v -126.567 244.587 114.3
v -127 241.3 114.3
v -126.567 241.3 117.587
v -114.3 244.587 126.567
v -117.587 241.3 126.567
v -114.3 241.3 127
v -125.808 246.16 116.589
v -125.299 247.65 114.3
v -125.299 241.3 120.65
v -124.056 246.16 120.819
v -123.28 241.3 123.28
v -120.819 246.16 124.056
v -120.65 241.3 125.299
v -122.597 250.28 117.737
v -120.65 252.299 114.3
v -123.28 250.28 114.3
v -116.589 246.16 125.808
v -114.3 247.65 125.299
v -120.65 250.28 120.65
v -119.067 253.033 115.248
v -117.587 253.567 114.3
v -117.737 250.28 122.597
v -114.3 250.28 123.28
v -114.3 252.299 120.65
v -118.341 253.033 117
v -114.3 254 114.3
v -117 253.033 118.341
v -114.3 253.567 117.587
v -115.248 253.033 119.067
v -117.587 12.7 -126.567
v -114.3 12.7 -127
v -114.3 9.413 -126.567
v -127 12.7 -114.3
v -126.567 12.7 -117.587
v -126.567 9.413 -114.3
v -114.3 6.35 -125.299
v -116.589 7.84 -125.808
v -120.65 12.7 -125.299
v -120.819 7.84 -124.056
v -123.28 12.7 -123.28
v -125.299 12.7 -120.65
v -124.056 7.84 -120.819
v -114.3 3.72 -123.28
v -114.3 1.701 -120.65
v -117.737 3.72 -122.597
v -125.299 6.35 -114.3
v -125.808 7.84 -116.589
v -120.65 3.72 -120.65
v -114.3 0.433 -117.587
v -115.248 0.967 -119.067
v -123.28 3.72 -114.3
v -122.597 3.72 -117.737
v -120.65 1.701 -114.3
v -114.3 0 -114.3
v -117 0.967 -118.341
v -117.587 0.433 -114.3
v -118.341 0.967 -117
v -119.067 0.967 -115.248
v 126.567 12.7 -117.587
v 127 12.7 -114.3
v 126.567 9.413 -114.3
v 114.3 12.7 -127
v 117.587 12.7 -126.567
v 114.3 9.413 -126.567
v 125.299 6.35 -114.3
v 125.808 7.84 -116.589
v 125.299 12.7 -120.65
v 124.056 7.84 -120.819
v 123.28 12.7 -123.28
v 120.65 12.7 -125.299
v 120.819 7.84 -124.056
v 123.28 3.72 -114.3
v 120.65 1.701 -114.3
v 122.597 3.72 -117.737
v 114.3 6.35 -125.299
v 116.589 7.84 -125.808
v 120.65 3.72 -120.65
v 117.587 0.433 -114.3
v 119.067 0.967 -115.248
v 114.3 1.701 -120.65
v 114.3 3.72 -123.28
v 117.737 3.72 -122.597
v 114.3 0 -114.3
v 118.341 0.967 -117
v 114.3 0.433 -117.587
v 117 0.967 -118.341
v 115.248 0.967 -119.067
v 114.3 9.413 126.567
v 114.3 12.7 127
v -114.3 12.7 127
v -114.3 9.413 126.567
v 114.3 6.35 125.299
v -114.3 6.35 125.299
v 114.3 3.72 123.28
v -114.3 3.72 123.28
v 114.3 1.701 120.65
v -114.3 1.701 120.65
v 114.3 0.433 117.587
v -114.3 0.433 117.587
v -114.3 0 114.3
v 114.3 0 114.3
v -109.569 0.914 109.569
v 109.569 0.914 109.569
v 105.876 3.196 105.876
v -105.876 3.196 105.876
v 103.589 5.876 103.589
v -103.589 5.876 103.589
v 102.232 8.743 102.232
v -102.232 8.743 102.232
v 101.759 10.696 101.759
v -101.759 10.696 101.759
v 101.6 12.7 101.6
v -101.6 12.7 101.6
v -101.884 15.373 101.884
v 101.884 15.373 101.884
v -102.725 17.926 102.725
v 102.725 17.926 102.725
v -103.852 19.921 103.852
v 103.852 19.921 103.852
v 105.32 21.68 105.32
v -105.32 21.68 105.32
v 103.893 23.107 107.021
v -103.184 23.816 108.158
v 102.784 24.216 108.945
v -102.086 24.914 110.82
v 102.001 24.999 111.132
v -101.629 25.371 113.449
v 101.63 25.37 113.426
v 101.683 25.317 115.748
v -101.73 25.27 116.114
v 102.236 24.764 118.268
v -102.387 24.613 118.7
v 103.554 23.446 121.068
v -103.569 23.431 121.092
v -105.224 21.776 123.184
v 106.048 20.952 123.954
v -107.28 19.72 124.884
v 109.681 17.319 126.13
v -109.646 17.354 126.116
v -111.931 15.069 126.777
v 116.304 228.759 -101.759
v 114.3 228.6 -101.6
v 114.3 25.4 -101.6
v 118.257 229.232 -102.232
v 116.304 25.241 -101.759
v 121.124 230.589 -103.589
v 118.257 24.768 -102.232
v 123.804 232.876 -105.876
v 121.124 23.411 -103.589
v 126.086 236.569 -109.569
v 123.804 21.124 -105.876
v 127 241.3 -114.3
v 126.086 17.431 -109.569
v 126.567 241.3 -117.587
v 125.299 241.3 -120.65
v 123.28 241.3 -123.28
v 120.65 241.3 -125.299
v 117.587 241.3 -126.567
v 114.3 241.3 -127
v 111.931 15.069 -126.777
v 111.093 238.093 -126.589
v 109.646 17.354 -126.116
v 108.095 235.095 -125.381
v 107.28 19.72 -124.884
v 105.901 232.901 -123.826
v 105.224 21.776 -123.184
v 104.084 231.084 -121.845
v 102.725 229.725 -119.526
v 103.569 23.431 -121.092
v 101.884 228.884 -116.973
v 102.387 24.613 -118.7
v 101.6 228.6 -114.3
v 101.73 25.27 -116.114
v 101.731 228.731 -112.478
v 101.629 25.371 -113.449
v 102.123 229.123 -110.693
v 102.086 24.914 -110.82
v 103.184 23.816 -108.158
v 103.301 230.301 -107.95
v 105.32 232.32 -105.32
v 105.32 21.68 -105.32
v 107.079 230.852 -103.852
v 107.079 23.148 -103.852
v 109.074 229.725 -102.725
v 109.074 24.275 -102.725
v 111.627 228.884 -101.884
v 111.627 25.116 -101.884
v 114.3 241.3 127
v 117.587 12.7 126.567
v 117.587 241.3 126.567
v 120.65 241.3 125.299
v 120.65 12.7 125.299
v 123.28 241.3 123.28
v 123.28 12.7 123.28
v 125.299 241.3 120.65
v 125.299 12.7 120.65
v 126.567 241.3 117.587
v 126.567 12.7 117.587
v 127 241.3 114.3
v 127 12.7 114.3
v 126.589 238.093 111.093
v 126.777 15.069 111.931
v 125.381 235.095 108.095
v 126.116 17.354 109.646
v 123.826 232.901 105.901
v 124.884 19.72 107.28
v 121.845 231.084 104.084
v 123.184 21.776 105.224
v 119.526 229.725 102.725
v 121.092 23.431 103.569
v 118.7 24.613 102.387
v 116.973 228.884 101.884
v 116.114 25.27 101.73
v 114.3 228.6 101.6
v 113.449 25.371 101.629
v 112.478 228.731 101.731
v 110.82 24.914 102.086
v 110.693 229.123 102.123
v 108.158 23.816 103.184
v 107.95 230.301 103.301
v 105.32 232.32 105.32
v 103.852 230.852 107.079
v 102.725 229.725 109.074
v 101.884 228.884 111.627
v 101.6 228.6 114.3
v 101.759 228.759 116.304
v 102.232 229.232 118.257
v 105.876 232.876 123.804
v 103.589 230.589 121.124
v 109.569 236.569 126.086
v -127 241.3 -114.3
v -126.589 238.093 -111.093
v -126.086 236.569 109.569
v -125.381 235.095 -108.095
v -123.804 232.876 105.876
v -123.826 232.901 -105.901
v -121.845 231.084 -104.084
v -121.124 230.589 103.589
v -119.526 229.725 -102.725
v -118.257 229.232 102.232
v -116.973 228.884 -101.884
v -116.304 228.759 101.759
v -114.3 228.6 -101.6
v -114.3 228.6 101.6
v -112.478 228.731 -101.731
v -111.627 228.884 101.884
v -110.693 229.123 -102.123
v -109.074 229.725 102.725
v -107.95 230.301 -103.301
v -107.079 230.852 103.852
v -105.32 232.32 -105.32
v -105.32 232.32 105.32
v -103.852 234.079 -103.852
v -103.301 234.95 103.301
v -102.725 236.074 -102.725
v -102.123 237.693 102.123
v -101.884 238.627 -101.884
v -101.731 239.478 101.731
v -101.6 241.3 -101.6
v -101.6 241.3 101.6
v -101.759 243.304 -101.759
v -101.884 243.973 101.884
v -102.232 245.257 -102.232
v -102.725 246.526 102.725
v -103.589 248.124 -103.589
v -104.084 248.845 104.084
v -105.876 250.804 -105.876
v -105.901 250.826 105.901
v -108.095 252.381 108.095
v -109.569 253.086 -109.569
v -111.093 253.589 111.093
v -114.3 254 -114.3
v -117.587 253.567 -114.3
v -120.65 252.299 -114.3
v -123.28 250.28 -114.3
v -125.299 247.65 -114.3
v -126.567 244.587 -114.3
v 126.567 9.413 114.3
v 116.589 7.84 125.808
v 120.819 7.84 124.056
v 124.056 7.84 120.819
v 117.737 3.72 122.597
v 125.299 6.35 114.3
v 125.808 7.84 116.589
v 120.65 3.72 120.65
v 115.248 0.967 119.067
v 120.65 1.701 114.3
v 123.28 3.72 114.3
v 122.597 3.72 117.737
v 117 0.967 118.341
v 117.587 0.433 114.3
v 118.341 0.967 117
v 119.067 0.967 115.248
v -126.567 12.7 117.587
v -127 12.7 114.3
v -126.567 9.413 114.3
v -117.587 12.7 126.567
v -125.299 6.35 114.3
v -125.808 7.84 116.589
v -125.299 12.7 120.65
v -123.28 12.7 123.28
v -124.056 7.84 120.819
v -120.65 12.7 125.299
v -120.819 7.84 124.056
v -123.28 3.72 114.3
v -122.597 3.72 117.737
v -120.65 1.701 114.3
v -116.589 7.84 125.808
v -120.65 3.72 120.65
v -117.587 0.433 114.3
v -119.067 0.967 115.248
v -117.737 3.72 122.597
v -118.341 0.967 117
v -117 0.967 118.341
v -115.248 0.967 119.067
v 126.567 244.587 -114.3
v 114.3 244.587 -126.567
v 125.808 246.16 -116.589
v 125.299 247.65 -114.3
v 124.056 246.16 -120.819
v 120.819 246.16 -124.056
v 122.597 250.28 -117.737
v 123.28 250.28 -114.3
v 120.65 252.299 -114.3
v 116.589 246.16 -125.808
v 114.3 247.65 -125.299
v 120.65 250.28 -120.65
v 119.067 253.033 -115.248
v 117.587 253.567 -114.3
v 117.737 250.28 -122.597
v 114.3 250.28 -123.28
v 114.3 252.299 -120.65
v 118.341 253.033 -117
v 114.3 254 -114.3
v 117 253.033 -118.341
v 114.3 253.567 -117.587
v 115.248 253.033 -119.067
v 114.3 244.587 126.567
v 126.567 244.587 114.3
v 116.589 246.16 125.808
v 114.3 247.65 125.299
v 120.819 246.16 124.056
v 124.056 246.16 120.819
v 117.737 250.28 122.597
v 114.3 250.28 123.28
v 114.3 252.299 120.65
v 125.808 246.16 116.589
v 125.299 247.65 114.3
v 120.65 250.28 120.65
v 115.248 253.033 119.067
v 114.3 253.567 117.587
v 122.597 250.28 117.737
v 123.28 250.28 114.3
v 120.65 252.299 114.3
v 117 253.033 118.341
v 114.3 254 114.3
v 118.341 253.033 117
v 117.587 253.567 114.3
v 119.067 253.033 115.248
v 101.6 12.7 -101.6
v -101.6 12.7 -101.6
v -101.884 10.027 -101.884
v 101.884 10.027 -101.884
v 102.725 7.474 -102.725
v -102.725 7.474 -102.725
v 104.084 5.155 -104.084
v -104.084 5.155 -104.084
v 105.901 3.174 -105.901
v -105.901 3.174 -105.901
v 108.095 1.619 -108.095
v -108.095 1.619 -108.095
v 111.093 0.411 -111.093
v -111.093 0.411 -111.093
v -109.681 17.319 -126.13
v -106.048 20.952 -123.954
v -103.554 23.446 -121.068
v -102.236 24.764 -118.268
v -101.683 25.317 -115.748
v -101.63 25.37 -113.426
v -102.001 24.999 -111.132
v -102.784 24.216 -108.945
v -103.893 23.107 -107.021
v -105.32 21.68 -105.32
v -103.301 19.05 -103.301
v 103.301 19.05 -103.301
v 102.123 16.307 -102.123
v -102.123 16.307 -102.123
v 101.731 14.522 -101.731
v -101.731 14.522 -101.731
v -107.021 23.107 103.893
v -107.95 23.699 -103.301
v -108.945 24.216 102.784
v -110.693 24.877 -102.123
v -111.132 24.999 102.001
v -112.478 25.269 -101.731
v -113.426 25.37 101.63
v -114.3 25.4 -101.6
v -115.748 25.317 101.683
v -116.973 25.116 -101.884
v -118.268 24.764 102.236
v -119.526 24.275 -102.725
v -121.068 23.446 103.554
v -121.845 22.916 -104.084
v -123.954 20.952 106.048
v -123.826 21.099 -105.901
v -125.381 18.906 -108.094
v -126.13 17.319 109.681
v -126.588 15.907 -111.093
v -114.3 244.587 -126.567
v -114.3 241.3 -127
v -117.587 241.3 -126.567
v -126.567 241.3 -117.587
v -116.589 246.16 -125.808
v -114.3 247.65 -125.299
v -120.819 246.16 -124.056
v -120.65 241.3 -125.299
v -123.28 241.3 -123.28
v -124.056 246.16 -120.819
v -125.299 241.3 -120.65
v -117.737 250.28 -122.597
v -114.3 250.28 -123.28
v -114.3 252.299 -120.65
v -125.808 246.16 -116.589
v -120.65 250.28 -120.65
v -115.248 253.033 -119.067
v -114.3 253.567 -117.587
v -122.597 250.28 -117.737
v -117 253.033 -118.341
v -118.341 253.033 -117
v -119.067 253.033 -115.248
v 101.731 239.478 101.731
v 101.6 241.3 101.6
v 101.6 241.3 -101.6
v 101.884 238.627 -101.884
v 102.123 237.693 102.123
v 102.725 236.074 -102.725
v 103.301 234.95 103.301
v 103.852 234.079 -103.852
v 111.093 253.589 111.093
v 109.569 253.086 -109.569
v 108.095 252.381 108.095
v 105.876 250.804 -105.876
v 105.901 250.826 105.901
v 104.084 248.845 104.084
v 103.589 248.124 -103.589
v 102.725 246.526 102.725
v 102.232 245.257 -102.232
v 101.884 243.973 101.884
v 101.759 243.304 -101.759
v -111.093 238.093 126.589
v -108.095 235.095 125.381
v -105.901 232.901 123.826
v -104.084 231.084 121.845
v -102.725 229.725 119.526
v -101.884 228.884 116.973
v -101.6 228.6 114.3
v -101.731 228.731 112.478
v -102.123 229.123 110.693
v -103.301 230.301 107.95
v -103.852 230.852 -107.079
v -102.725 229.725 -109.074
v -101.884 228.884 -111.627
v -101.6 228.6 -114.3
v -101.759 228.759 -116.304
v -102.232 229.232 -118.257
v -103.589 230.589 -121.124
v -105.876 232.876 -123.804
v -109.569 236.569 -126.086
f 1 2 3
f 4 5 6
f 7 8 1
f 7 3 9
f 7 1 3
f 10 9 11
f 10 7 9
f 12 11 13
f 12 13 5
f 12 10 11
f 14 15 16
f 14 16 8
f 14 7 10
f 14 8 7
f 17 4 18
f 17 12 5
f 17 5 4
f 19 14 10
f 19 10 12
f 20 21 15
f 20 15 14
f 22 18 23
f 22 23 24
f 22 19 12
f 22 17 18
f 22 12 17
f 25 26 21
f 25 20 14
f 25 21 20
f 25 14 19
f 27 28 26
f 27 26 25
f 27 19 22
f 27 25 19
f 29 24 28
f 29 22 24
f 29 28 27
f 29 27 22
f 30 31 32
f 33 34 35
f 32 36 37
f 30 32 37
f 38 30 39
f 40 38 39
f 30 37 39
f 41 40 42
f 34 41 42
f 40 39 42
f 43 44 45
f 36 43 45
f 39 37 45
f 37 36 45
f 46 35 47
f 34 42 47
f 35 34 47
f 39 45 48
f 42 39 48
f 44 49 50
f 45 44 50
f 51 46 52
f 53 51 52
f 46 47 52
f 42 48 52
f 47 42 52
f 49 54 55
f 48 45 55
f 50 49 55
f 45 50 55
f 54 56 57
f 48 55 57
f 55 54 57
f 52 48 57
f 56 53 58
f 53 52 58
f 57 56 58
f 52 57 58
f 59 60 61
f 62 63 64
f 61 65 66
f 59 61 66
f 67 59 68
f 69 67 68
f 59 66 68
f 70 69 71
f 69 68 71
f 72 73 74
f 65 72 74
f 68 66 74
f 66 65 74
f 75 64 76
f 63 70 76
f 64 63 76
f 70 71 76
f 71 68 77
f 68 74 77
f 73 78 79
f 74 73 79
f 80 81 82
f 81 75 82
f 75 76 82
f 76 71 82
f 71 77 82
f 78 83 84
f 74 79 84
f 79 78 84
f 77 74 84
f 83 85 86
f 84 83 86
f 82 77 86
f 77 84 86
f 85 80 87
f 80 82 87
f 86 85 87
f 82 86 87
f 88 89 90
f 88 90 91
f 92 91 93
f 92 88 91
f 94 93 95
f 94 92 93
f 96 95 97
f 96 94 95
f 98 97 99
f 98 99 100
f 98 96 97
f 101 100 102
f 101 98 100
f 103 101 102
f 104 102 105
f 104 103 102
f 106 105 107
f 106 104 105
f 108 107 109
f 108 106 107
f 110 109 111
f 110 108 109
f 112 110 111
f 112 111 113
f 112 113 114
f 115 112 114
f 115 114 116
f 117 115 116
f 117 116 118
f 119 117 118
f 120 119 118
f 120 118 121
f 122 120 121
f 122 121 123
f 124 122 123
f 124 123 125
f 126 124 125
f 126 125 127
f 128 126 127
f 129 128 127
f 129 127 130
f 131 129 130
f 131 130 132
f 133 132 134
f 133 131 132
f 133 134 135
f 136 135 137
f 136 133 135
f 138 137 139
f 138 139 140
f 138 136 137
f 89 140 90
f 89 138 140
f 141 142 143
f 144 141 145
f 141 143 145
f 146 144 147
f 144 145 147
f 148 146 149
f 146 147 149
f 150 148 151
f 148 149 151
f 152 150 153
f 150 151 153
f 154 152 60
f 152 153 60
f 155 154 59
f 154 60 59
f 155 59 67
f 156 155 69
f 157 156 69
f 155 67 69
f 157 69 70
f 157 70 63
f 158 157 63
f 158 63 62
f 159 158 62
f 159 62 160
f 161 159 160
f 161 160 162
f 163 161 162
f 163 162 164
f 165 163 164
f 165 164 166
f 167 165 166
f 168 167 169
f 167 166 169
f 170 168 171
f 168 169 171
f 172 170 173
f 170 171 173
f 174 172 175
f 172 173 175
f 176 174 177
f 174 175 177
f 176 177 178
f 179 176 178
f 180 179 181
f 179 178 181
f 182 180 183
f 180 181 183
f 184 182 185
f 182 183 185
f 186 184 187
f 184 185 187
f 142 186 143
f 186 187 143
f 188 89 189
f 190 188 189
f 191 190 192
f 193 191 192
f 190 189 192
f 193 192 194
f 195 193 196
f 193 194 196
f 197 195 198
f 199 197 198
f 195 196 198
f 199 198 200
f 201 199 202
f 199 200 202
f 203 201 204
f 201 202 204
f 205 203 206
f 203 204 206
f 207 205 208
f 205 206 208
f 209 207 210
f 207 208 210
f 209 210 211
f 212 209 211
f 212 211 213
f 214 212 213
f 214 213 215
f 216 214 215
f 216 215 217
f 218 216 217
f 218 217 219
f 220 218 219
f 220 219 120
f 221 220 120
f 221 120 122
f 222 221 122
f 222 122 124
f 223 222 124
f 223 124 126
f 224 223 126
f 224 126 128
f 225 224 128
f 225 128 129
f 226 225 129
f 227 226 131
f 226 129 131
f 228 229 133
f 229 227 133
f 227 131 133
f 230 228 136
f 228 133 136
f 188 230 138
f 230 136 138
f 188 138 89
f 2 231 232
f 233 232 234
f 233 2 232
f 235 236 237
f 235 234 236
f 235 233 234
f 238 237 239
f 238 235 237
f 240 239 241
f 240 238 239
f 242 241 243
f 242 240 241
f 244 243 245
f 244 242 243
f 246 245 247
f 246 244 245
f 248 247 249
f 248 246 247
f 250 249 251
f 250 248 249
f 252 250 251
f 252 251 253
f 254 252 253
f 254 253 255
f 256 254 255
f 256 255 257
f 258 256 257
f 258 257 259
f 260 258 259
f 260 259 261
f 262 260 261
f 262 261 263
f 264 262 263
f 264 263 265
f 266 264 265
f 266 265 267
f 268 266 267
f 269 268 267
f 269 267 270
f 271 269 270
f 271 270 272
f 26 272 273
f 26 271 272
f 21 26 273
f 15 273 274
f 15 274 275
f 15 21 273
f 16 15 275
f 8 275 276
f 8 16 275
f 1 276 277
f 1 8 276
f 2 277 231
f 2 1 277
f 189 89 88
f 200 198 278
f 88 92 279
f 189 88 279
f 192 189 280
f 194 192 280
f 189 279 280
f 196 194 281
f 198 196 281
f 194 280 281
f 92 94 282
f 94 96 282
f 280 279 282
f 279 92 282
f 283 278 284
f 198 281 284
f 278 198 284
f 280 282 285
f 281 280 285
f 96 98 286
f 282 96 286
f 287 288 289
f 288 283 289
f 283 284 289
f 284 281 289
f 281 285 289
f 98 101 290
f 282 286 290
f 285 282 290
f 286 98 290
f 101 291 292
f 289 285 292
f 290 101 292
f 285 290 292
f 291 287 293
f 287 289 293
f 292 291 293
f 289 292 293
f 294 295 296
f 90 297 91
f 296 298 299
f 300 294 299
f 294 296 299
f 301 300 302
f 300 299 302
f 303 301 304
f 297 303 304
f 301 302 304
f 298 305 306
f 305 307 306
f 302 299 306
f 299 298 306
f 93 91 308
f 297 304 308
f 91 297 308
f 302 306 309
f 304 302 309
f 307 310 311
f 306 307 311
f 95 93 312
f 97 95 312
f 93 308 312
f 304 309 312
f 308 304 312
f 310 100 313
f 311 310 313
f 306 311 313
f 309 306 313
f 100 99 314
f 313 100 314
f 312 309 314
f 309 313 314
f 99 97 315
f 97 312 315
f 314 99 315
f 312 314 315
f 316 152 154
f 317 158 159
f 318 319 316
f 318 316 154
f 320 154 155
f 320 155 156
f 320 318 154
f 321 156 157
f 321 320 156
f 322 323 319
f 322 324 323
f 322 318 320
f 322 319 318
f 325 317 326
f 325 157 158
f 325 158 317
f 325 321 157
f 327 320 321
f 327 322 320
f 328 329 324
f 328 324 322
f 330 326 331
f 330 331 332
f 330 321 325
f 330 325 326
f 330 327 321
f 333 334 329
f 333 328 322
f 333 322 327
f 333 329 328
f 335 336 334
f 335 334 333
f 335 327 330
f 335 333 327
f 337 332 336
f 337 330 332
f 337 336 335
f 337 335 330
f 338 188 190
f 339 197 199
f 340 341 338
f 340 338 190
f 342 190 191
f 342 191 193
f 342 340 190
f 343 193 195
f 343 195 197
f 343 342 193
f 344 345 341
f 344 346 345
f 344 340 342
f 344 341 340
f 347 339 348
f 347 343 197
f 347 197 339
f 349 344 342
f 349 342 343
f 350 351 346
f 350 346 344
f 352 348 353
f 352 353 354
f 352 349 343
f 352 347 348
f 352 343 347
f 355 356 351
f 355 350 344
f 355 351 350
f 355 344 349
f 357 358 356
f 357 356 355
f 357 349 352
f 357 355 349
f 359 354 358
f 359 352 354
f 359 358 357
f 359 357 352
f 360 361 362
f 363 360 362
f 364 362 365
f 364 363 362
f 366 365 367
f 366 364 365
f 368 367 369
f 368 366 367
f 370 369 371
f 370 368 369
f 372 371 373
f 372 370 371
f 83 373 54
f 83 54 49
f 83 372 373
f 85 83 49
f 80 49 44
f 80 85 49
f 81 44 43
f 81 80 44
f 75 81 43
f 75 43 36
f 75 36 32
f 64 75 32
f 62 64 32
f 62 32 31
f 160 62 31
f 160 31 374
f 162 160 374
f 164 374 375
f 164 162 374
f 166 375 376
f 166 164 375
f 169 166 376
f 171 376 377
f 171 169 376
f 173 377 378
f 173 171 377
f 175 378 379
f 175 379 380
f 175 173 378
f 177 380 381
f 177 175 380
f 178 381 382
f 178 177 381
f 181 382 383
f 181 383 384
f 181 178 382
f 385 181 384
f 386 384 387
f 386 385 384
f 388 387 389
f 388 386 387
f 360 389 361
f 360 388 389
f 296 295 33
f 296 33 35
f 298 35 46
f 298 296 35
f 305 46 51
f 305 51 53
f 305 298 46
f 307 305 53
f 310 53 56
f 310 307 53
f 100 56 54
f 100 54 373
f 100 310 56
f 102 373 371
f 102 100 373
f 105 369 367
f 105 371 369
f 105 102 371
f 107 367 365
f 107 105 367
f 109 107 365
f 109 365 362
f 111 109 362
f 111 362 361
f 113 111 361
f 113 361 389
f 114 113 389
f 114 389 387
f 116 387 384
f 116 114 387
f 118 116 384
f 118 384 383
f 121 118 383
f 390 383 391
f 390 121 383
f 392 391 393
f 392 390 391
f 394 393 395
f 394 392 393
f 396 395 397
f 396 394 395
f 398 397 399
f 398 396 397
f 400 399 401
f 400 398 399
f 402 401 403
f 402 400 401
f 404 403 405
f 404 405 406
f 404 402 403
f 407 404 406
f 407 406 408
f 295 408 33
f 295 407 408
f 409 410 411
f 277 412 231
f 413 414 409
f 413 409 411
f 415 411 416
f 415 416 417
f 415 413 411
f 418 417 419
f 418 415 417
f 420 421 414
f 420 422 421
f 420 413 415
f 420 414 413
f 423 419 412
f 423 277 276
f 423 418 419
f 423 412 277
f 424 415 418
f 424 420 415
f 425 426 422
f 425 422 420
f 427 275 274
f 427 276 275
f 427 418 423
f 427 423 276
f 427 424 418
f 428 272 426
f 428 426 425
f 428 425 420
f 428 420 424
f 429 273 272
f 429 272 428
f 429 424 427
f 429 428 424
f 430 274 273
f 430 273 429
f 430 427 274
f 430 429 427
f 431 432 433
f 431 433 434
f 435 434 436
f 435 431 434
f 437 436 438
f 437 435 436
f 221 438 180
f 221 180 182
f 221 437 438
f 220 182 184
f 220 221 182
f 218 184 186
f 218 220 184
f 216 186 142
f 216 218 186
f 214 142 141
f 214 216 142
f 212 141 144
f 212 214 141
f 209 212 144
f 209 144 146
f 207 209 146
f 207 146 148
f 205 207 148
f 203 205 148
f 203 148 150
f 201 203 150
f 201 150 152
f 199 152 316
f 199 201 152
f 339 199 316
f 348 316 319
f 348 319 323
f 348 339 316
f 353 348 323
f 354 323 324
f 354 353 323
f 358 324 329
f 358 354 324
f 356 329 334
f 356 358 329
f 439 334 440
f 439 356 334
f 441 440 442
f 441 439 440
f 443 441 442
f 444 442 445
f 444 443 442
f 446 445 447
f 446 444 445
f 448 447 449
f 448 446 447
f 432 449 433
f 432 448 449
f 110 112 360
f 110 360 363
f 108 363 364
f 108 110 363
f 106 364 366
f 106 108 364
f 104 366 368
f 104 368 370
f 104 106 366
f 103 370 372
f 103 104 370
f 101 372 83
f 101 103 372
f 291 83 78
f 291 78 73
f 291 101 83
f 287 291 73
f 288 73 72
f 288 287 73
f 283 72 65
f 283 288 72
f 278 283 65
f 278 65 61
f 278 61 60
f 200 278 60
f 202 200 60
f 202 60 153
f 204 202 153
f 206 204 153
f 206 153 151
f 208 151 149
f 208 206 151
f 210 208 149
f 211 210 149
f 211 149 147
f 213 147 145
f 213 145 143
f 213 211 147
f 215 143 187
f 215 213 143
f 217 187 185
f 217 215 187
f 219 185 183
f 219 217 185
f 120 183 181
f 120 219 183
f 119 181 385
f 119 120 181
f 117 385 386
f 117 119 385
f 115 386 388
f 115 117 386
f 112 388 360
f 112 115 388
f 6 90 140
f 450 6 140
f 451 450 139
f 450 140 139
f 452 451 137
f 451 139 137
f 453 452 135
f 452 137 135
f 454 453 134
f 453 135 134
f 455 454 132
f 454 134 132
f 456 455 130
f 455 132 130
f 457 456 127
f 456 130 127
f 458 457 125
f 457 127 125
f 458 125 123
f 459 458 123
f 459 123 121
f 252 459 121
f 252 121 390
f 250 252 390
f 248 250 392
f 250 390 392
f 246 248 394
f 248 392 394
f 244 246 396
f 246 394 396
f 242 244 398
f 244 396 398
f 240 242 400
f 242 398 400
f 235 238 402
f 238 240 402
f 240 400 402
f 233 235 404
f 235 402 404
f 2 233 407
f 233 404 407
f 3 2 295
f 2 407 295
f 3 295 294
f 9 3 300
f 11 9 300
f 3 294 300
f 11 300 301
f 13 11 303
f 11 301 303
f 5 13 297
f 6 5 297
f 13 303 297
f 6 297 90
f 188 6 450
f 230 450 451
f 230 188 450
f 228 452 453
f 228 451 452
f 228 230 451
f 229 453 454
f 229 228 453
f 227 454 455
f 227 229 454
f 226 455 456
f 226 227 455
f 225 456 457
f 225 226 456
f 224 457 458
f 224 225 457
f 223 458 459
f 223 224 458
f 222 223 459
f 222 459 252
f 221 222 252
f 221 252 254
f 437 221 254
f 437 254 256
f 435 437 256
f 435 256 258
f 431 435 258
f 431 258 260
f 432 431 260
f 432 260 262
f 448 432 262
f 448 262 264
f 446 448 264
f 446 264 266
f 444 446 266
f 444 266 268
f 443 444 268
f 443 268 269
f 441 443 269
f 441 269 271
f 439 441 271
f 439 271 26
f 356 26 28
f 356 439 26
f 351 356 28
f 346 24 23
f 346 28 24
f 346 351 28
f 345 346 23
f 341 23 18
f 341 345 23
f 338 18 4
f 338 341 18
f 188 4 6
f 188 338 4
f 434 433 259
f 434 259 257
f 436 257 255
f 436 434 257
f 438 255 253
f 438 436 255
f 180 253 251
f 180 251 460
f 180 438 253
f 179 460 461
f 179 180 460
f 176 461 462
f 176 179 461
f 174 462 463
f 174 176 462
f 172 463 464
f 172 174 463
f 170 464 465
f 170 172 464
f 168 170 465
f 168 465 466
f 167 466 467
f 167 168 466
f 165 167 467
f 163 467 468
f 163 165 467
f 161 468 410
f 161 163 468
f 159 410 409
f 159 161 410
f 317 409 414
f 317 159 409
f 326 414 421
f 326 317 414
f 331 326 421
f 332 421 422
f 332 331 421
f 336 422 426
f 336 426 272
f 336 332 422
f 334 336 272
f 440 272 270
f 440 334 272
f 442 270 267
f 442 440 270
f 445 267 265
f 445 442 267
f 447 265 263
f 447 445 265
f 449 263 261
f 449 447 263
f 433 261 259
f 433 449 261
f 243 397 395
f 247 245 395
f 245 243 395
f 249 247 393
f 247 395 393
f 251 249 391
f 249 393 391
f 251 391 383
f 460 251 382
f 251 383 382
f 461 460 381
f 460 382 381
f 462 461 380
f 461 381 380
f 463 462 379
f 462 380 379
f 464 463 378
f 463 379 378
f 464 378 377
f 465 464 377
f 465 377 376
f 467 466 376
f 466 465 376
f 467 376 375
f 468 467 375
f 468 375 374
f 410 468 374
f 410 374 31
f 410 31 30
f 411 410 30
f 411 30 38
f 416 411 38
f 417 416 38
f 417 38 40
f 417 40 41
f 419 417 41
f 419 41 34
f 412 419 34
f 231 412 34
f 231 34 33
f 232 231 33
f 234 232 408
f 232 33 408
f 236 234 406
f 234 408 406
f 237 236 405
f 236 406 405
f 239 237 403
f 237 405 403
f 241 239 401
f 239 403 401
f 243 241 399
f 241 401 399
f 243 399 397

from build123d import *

# Parameters (mm, degrees)
SKETCH5_R            = 12.7
BOSS_EXTRUDE2_DEPTH  = 254
FILLET2_R            = 12.7
LPATTERN1_COUNT      = 2
LPATTERN1_PITCH      = 228.6
LPATTERN1_2_COUNT    = 2
LPATTERN1_2_PITCH    = 228.6
SKETCH6_R            = 12.7
BOSS_EXTRUDE3_DEPTH  = 114.3
LPATTERN2_COUNT      = 2
LPATTERN2_PITCH      = 228.6
LPATTERN2_COUNT_DIR2 = 2
LPATTERN2_PITCH_DIR2 = 228.6
SKETCH8_R            = 12.7
BOSS_EXTRUDE4_DEPTH  = 114.3
LPATTERN3_COUNT      = 2
LPATTERN3_PITCH      = 228.6
LPATTERN3_COUNT_DIR2 = 2
LPATTERN3_PITCH_DIR2 = 228.6


with BuildPart() as part:
    # Sketch5 → Boss-Extrude2 (new body)
    with BuildSketch(Plane(origin=(0, 0, 0), x_dir=(1, 0, 0), z_dir=(0, 1, 0))):
        with Locations(Location((-114.3, 114.3, 0), (0, 0, 270))):
            Circle(SKETCH5_R)
    extrude(amount=BOSS_EXTRUDE2_DEPTH)

    # Fillet2
    fillet2_edges = [part.edges().sort_by_distance(p)[0] for p in [
        (-114.3, 0, -127),
        (-114.3, 254, -127),
    ]]
    fillet(fillet2_edges, radius=FILLET2_R)


with BuildPart() as lpattern1_1:
    # LPattern1: pattern copy
    add(part.part.moved(Location(Vector(1, 0, 0) * (1 * LPATTERN1_PITCH))))


with BuildPart() as lpattern1_2_1:
    # LPattern1 2: pattern copy
    add(part.part.moved(Location(Vector(0, 0, 1) * (1 * LPATTERN1_2_PITCH))))



with BuildPart() as lpattern1_2_2:
    # LPattern1 2: pattern copy
    add(lpattern1_1.part.moved(Location(Vector(0, 0, 1) * (1 * LPATTERN1_2_PITCH))))


with BuildPart() as lpattern1_2_1_1:
    add(lpattern1_2_1.part)

    add(lpattern1_2_2.part)  # Boss-Extrude3 merges LPattern1 2_2
    # Sketch6 → Boss-Extrude3 (add, symmetric)
    with BuildSketch(Plane(origin=(0, 0, 0), x_dir=(0, 0, -1), z_dir=(1, 0, 0))):
        with Locations(Location((-114.3, 241.3, 0), (0, 0, 180))):
            Circle(SKETCH6_R)
    boss_extrude3 = extrude(amount=BOSS_EXTRUDE3_DEPTH, both=True)


with BuildPart() as part_1:
    add(part.part)

    add(lpattern1_1.part)  # LPattern2 merges LPattern1_1

    add(lpattern1_2_1_1.part)  # LPattern2 merges LPattern1 2_1
    # LPattern2: Boss-Extrude3 2 × 2
    with Locations(*[(0, -j * LPATTERN2_PITCH_DIR2, -i * LPATTERN2_PITCH) for i in range(LPATTERN2_COUNT) for j in range(LPATTERN2_COUNT_DIR2) if (i, j) != (0, 0)]):
        add(boss_extrude3)

    # Sketch8 → Boss-Extrude4 (add, symmetric)
    with BuildSketch(Plane.XY):
        with Locations(Location((-114.3, 241.3, 0), (0, 0, 180))):
            Circle(SKETCH8_R)
    boss_extrude4 = extrude(amount=BOSS_EXTRUDE4_DEPTH, both=True)

    # LPattern3: Boss-Extrude4 2 × 2
    with Locations(*[(i * LPATTERN3_PITCH, -j * LPATTERN3_PITCH_DIR2, 0) for i in range(LPATTERN3_COUNT) for j in range(LPATTERN3_COUNT_DIR2) if (i, j) != (0, 0)]):
        add(boss_extrude4)


solid = part_1.part
